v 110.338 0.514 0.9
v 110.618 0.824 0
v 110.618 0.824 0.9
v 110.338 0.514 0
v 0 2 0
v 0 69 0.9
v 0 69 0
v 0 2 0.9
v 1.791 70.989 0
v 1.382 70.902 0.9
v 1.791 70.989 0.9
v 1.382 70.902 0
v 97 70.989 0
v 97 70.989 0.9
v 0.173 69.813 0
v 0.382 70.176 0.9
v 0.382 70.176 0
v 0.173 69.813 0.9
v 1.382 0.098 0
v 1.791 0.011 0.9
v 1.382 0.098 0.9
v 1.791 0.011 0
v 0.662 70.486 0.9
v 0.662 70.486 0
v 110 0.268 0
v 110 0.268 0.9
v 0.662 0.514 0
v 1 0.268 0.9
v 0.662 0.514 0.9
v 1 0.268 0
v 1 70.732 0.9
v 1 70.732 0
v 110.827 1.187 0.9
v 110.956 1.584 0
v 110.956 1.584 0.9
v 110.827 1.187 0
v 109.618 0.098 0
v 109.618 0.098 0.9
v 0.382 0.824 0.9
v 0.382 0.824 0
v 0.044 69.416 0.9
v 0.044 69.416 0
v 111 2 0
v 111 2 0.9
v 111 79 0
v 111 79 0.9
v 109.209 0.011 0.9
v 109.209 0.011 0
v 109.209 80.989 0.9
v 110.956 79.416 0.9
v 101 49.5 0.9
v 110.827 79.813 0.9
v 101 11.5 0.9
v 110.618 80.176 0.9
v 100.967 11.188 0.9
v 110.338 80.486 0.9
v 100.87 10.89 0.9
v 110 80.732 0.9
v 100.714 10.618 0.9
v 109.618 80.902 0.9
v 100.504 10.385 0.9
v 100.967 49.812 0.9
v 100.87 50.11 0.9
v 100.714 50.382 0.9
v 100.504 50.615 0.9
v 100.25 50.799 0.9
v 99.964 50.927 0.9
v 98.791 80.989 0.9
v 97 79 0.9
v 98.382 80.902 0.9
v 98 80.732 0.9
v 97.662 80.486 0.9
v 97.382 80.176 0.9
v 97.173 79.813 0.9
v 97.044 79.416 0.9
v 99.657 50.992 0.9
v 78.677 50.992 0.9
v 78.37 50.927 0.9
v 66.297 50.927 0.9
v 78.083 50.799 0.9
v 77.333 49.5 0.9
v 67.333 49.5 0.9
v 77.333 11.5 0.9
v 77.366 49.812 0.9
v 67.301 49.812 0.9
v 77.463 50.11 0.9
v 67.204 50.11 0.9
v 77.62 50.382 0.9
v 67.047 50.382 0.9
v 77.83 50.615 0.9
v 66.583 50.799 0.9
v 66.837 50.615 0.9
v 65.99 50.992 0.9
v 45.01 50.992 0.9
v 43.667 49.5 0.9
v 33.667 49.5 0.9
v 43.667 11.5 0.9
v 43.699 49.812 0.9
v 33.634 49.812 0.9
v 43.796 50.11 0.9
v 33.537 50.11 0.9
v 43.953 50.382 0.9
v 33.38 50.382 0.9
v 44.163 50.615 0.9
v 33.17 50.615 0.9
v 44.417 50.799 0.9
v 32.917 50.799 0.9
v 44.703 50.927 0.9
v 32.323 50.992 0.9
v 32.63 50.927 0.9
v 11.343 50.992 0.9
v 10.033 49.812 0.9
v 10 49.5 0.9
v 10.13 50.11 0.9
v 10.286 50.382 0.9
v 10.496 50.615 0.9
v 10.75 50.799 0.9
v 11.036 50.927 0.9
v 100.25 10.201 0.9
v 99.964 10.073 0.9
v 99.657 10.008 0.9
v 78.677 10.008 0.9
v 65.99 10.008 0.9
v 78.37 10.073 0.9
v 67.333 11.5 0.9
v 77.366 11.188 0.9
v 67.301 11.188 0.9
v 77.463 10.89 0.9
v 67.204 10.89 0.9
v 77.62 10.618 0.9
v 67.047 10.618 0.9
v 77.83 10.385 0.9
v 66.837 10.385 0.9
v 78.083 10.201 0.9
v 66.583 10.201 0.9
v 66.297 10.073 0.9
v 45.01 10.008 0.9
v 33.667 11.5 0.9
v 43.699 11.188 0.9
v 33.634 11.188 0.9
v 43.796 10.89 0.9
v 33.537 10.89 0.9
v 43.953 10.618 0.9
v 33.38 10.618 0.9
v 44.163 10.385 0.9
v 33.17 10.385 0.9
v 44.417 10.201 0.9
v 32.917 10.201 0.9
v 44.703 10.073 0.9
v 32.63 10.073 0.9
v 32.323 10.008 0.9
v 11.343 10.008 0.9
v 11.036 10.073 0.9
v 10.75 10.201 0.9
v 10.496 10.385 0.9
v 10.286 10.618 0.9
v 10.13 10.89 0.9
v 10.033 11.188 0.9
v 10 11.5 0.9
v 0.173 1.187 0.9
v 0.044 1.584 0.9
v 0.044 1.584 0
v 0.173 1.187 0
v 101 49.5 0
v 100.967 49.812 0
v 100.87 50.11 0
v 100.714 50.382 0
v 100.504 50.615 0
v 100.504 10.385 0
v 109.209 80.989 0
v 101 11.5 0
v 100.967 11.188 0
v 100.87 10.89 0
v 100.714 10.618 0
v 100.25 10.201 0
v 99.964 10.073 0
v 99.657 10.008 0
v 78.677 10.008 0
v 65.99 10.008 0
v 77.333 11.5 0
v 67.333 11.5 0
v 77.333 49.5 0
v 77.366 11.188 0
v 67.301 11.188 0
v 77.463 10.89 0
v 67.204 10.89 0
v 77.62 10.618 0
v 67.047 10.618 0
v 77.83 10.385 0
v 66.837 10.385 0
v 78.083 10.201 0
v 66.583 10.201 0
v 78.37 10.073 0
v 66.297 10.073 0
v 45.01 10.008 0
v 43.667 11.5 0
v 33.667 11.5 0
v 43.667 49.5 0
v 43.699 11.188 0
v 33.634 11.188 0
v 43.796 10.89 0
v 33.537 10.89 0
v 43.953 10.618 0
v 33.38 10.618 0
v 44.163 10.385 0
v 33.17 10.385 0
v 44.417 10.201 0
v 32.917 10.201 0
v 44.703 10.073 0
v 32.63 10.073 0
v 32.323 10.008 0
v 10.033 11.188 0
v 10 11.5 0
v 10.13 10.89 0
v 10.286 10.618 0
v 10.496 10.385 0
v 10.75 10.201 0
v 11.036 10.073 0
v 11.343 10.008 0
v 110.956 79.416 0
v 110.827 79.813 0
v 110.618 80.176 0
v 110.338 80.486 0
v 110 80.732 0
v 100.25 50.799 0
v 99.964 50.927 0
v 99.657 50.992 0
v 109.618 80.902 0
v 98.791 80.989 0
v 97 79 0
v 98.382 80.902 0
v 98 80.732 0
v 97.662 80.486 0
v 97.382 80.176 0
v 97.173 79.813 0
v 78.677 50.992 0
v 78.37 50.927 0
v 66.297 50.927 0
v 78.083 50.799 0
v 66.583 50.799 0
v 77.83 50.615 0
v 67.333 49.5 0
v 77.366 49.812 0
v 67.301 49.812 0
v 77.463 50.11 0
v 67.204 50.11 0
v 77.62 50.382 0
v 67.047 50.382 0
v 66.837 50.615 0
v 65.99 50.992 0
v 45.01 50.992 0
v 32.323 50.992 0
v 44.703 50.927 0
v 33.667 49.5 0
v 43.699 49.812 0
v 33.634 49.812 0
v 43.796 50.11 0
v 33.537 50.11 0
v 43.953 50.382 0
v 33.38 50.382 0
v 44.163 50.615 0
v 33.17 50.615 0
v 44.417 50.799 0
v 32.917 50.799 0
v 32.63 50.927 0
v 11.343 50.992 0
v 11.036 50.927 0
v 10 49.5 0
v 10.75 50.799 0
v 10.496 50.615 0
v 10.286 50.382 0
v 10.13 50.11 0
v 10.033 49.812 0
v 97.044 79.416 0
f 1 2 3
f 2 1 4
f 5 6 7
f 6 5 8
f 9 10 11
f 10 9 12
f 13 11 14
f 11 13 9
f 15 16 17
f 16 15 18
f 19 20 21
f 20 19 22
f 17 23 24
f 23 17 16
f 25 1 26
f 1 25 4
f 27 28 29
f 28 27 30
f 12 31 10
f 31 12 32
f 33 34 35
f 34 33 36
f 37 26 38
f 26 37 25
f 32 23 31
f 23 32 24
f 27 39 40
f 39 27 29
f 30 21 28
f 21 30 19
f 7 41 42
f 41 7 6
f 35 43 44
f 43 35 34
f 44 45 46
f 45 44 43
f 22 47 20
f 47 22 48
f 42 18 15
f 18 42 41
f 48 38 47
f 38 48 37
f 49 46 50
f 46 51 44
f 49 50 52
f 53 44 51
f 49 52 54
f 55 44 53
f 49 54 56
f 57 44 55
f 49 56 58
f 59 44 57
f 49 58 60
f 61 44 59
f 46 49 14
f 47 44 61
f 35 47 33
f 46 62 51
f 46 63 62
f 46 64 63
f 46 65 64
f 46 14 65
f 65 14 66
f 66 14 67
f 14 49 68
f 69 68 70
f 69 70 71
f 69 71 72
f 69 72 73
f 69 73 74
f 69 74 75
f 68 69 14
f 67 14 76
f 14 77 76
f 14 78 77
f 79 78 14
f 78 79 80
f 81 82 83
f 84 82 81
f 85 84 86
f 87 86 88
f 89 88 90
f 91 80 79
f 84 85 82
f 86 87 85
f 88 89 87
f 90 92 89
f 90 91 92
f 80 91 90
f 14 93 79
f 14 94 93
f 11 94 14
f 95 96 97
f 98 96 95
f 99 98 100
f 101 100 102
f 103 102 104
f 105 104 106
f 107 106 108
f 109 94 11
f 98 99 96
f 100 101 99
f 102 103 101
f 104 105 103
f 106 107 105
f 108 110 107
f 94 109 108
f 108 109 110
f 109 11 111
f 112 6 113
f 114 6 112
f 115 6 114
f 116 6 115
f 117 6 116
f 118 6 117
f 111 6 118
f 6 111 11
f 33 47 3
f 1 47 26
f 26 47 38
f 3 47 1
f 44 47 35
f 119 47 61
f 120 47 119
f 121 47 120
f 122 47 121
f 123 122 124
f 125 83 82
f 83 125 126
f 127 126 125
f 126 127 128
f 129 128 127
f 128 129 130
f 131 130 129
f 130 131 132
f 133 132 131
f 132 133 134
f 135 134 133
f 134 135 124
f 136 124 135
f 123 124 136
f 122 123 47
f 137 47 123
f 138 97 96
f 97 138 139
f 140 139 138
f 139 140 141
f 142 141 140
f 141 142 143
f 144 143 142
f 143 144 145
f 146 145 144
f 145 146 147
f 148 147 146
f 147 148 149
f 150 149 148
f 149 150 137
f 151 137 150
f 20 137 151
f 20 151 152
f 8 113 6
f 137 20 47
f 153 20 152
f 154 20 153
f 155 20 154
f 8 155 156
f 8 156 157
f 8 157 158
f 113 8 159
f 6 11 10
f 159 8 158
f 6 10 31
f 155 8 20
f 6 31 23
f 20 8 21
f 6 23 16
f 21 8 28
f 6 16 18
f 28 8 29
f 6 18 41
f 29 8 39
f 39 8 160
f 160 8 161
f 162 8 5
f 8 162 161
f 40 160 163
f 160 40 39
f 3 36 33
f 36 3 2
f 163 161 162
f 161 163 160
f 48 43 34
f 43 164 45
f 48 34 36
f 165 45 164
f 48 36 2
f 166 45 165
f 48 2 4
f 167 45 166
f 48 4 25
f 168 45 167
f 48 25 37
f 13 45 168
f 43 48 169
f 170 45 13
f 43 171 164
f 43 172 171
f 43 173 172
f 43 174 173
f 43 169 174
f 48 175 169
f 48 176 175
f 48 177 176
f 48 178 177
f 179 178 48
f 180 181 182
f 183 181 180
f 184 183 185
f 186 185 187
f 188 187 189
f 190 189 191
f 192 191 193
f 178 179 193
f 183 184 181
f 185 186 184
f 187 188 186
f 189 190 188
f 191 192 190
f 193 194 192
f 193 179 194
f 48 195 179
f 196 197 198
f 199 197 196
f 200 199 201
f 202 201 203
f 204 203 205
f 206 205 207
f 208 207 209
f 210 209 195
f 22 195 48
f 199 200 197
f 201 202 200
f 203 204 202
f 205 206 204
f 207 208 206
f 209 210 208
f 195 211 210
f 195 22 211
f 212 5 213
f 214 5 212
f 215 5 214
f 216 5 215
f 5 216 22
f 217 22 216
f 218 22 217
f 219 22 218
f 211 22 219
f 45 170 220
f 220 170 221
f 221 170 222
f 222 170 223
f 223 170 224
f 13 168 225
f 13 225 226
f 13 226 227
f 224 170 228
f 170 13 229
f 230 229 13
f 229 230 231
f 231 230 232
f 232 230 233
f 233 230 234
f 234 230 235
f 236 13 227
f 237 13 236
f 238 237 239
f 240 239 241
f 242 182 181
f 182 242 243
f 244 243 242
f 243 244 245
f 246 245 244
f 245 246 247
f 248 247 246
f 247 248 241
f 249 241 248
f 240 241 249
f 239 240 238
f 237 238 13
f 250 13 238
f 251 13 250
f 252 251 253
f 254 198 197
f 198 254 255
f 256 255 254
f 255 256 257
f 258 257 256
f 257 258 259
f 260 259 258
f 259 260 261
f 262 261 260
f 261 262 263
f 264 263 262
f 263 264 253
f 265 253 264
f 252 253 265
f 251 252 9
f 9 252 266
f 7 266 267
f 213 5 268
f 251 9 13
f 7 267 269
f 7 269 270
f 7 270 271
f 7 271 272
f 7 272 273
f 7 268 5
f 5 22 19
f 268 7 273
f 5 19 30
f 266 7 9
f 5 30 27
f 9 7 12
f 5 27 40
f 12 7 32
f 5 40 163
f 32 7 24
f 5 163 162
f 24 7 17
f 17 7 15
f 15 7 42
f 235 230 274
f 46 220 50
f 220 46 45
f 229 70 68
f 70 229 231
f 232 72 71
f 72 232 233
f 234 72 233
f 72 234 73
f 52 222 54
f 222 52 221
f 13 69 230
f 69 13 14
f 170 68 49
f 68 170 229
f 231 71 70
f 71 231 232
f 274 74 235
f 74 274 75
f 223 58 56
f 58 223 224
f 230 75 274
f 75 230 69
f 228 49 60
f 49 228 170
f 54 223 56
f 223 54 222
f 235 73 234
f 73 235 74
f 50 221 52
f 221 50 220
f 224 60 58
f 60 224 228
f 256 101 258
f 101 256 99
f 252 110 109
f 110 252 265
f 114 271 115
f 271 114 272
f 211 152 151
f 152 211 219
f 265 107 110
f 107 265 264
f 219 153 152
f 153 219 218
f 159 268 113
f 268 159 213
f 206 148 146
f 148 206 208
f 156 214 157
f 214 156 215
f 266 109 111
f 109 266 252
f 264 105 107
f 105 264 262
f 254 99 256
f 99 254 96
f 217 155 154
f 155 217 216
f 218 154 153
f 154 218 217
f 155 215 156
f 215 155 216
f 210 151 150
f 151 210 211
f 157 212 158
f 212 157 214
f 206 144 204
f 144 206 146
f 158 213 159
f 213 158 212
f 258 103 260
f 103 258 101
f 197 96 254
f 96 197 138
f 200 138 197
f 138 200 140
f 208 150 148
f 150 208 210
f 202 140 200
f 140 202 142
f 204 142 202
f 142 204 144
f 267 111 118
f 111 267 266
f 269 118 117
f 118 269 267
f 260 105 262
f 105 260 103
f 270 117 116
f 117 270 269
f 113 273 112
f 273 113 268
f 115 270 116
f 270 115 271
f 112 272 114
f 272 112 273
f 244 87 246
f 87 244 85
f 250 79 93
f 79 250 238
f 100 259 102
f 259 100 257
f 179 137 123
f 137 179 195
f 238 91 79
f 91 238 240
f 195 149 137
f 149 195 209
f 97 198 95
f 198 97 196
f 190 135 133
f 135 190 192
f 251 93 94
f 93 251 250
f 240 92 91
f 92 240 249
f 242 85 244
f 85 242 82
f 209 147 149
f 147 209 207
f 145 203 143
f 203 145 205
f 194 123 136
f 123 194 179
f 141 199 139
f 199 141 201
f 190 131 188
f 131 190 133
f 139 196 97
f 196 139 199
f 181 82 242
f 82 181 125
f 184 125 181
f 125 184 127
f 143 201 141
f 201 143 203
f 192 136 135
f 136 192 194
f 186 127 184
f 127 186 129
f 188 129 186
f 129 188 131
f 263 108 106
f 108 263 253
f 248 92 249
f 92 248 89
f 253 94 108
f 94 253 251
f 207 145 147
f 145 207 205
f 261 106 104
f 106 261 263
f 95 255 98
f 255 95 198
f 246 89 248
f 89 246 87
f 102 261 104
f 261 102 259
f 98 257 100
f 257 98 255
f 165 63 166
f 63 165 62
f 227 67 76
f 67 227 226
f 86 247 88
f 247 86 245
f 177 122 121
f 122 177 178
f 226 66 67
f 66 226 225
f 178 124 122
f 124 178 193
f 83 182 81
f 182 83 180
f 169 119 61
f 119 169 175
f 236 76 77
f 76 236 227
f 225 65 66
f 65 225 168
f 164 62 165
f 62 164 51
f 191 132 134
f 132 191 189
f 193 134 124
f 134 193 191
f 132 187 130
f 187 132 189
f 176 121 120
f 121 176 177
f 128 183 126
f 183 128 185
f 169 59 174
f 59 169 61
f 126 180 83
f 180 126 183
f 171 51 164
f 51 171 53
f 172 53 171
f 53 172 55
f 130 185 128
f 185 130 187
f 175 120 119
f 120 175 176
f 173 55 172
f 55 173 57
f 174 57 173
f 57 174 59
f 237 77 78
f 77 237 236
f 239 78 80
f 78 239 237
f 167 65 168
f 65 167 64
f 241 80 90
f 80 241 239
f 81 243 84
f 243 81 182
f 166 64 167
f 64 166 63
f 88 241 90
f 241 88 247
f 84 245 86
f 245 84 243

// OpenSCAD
// =========================================================================
// PARAMETER - Hier kannst du die Maße flexibel anpassen
// =========================================================================

karten_breite   = 111;    // Breite der Karteikarte (in mm)
karten_hoehe    = 71;     // Höhe der Karteikarte mit Reiter (ca. 70.5 mm)
karten_staerke  = 0.9;    // Dicke der Trennkarte (1.0 mm ist ideal)

reiter_breite   = 14;     // Breite des Reiters oben (14 mm)
reiter_hoehe    = 10;     // Höhe des Reiters, der oben herausragt (in mm)

// SAUBERE REITEREINSTELLUNG
anzahl_positionen = 9;    // Wie viele Tab-Positionen soll es insgesamt geben? (z.B. 5 oder 6)
reiter_position   = 8;    // Aktuelle Position: 0 ist ganz links, 
                          // (anzahl_positionen - 1) ist ganz rechts.
                          // Bei 5 Positionen sind das die Zahlen: 0, 1, 2, 3, 4

ecken_radius    = 2.0;    // Abrundung der Ecken unten und am Reiter
$fn             = 30;     // Auflösung der Rundungen

// =========================================================================
// BERECHNUNGEN & MODELLIERUNG
// =========================================================================

// Der mathematisch exakte Bereich, in dem sich der Reiter bewegen darf
verfuegbarer_weg = karten_breite - reiter_breite;

// Berechnet den exakten Schrittabstand für eine perfekt symmetrische Verteilung
schritt_weite = (anzahl_positionen > 1) ? (verfuegbarer_weg / (anzahl_positionen - 1)) : 0;

// Die finale X-Position für den aktuellen Reiter
reiter_x = reiter_position * schritt_weite;

module abgerundete_platte(w, h, d, r) {
    translate([r, r, 0])
    minkowski() {
        cube([w - 2*r, h - 2*r, d / 2]);
        cylinder(r = r, h = d / 2);
    }
}

module abgerundetes_rechteck_mit_reiter(w, h, d, r) {
    translate([r, 0, 0])
    minkowski() {
        cube([w - 2*r, h - r, d / 2]);
        cylinder(r = r, h = d / 2);
    }
}

// Hauptmodell mit Material-Aussparungen
difference() {
    // Das ursprüngliche finale 3D-Modell (Körper + Reiter)
    union() {
        // 1. Die Hauptkarte
        abgerundete_platte(karten_breite, karten_hoehe, karten_staerke, ecken_radius);
        
        // 2. Der Reiter (Tab) oben drauf
        translate([reiter_x, karten_hoehe - ecken_radius, 0])
            abgerundetes_rechteck_mit_reiter(reiter_breite, reiter_hoehe + ecken_radius, karten_staerke, ecken_radius);
    }

    // 3. MATERIAL-AUSSPARUNGEN (3 Fenster in der Mitte)
    rand_aussen_x  = 10;  
    rand_unten     = 10;  
    rand_oben      = 20;  
    steg_breite    = 10;  
    
    verfuegbare_breite = karten_breite - (2 * rand_aussen_x) - (2 * steg_breite);
    fenster_breite     = verfuegbare_breite / 3;
    fenster_hoehe      = karten_hoehe - rand_unten - rand_oben;

    for (f = [0 : 2]) {
        x_pos = rand_aussen_x + f * (fenster_breite + steg_breite);
        
        translate([x_pos, rand_unten, -0.1])
            abgerundete_platte(fenster_breite, fenster_hoehe, karten_staerke + 0.2, 1.5);
    }
}
